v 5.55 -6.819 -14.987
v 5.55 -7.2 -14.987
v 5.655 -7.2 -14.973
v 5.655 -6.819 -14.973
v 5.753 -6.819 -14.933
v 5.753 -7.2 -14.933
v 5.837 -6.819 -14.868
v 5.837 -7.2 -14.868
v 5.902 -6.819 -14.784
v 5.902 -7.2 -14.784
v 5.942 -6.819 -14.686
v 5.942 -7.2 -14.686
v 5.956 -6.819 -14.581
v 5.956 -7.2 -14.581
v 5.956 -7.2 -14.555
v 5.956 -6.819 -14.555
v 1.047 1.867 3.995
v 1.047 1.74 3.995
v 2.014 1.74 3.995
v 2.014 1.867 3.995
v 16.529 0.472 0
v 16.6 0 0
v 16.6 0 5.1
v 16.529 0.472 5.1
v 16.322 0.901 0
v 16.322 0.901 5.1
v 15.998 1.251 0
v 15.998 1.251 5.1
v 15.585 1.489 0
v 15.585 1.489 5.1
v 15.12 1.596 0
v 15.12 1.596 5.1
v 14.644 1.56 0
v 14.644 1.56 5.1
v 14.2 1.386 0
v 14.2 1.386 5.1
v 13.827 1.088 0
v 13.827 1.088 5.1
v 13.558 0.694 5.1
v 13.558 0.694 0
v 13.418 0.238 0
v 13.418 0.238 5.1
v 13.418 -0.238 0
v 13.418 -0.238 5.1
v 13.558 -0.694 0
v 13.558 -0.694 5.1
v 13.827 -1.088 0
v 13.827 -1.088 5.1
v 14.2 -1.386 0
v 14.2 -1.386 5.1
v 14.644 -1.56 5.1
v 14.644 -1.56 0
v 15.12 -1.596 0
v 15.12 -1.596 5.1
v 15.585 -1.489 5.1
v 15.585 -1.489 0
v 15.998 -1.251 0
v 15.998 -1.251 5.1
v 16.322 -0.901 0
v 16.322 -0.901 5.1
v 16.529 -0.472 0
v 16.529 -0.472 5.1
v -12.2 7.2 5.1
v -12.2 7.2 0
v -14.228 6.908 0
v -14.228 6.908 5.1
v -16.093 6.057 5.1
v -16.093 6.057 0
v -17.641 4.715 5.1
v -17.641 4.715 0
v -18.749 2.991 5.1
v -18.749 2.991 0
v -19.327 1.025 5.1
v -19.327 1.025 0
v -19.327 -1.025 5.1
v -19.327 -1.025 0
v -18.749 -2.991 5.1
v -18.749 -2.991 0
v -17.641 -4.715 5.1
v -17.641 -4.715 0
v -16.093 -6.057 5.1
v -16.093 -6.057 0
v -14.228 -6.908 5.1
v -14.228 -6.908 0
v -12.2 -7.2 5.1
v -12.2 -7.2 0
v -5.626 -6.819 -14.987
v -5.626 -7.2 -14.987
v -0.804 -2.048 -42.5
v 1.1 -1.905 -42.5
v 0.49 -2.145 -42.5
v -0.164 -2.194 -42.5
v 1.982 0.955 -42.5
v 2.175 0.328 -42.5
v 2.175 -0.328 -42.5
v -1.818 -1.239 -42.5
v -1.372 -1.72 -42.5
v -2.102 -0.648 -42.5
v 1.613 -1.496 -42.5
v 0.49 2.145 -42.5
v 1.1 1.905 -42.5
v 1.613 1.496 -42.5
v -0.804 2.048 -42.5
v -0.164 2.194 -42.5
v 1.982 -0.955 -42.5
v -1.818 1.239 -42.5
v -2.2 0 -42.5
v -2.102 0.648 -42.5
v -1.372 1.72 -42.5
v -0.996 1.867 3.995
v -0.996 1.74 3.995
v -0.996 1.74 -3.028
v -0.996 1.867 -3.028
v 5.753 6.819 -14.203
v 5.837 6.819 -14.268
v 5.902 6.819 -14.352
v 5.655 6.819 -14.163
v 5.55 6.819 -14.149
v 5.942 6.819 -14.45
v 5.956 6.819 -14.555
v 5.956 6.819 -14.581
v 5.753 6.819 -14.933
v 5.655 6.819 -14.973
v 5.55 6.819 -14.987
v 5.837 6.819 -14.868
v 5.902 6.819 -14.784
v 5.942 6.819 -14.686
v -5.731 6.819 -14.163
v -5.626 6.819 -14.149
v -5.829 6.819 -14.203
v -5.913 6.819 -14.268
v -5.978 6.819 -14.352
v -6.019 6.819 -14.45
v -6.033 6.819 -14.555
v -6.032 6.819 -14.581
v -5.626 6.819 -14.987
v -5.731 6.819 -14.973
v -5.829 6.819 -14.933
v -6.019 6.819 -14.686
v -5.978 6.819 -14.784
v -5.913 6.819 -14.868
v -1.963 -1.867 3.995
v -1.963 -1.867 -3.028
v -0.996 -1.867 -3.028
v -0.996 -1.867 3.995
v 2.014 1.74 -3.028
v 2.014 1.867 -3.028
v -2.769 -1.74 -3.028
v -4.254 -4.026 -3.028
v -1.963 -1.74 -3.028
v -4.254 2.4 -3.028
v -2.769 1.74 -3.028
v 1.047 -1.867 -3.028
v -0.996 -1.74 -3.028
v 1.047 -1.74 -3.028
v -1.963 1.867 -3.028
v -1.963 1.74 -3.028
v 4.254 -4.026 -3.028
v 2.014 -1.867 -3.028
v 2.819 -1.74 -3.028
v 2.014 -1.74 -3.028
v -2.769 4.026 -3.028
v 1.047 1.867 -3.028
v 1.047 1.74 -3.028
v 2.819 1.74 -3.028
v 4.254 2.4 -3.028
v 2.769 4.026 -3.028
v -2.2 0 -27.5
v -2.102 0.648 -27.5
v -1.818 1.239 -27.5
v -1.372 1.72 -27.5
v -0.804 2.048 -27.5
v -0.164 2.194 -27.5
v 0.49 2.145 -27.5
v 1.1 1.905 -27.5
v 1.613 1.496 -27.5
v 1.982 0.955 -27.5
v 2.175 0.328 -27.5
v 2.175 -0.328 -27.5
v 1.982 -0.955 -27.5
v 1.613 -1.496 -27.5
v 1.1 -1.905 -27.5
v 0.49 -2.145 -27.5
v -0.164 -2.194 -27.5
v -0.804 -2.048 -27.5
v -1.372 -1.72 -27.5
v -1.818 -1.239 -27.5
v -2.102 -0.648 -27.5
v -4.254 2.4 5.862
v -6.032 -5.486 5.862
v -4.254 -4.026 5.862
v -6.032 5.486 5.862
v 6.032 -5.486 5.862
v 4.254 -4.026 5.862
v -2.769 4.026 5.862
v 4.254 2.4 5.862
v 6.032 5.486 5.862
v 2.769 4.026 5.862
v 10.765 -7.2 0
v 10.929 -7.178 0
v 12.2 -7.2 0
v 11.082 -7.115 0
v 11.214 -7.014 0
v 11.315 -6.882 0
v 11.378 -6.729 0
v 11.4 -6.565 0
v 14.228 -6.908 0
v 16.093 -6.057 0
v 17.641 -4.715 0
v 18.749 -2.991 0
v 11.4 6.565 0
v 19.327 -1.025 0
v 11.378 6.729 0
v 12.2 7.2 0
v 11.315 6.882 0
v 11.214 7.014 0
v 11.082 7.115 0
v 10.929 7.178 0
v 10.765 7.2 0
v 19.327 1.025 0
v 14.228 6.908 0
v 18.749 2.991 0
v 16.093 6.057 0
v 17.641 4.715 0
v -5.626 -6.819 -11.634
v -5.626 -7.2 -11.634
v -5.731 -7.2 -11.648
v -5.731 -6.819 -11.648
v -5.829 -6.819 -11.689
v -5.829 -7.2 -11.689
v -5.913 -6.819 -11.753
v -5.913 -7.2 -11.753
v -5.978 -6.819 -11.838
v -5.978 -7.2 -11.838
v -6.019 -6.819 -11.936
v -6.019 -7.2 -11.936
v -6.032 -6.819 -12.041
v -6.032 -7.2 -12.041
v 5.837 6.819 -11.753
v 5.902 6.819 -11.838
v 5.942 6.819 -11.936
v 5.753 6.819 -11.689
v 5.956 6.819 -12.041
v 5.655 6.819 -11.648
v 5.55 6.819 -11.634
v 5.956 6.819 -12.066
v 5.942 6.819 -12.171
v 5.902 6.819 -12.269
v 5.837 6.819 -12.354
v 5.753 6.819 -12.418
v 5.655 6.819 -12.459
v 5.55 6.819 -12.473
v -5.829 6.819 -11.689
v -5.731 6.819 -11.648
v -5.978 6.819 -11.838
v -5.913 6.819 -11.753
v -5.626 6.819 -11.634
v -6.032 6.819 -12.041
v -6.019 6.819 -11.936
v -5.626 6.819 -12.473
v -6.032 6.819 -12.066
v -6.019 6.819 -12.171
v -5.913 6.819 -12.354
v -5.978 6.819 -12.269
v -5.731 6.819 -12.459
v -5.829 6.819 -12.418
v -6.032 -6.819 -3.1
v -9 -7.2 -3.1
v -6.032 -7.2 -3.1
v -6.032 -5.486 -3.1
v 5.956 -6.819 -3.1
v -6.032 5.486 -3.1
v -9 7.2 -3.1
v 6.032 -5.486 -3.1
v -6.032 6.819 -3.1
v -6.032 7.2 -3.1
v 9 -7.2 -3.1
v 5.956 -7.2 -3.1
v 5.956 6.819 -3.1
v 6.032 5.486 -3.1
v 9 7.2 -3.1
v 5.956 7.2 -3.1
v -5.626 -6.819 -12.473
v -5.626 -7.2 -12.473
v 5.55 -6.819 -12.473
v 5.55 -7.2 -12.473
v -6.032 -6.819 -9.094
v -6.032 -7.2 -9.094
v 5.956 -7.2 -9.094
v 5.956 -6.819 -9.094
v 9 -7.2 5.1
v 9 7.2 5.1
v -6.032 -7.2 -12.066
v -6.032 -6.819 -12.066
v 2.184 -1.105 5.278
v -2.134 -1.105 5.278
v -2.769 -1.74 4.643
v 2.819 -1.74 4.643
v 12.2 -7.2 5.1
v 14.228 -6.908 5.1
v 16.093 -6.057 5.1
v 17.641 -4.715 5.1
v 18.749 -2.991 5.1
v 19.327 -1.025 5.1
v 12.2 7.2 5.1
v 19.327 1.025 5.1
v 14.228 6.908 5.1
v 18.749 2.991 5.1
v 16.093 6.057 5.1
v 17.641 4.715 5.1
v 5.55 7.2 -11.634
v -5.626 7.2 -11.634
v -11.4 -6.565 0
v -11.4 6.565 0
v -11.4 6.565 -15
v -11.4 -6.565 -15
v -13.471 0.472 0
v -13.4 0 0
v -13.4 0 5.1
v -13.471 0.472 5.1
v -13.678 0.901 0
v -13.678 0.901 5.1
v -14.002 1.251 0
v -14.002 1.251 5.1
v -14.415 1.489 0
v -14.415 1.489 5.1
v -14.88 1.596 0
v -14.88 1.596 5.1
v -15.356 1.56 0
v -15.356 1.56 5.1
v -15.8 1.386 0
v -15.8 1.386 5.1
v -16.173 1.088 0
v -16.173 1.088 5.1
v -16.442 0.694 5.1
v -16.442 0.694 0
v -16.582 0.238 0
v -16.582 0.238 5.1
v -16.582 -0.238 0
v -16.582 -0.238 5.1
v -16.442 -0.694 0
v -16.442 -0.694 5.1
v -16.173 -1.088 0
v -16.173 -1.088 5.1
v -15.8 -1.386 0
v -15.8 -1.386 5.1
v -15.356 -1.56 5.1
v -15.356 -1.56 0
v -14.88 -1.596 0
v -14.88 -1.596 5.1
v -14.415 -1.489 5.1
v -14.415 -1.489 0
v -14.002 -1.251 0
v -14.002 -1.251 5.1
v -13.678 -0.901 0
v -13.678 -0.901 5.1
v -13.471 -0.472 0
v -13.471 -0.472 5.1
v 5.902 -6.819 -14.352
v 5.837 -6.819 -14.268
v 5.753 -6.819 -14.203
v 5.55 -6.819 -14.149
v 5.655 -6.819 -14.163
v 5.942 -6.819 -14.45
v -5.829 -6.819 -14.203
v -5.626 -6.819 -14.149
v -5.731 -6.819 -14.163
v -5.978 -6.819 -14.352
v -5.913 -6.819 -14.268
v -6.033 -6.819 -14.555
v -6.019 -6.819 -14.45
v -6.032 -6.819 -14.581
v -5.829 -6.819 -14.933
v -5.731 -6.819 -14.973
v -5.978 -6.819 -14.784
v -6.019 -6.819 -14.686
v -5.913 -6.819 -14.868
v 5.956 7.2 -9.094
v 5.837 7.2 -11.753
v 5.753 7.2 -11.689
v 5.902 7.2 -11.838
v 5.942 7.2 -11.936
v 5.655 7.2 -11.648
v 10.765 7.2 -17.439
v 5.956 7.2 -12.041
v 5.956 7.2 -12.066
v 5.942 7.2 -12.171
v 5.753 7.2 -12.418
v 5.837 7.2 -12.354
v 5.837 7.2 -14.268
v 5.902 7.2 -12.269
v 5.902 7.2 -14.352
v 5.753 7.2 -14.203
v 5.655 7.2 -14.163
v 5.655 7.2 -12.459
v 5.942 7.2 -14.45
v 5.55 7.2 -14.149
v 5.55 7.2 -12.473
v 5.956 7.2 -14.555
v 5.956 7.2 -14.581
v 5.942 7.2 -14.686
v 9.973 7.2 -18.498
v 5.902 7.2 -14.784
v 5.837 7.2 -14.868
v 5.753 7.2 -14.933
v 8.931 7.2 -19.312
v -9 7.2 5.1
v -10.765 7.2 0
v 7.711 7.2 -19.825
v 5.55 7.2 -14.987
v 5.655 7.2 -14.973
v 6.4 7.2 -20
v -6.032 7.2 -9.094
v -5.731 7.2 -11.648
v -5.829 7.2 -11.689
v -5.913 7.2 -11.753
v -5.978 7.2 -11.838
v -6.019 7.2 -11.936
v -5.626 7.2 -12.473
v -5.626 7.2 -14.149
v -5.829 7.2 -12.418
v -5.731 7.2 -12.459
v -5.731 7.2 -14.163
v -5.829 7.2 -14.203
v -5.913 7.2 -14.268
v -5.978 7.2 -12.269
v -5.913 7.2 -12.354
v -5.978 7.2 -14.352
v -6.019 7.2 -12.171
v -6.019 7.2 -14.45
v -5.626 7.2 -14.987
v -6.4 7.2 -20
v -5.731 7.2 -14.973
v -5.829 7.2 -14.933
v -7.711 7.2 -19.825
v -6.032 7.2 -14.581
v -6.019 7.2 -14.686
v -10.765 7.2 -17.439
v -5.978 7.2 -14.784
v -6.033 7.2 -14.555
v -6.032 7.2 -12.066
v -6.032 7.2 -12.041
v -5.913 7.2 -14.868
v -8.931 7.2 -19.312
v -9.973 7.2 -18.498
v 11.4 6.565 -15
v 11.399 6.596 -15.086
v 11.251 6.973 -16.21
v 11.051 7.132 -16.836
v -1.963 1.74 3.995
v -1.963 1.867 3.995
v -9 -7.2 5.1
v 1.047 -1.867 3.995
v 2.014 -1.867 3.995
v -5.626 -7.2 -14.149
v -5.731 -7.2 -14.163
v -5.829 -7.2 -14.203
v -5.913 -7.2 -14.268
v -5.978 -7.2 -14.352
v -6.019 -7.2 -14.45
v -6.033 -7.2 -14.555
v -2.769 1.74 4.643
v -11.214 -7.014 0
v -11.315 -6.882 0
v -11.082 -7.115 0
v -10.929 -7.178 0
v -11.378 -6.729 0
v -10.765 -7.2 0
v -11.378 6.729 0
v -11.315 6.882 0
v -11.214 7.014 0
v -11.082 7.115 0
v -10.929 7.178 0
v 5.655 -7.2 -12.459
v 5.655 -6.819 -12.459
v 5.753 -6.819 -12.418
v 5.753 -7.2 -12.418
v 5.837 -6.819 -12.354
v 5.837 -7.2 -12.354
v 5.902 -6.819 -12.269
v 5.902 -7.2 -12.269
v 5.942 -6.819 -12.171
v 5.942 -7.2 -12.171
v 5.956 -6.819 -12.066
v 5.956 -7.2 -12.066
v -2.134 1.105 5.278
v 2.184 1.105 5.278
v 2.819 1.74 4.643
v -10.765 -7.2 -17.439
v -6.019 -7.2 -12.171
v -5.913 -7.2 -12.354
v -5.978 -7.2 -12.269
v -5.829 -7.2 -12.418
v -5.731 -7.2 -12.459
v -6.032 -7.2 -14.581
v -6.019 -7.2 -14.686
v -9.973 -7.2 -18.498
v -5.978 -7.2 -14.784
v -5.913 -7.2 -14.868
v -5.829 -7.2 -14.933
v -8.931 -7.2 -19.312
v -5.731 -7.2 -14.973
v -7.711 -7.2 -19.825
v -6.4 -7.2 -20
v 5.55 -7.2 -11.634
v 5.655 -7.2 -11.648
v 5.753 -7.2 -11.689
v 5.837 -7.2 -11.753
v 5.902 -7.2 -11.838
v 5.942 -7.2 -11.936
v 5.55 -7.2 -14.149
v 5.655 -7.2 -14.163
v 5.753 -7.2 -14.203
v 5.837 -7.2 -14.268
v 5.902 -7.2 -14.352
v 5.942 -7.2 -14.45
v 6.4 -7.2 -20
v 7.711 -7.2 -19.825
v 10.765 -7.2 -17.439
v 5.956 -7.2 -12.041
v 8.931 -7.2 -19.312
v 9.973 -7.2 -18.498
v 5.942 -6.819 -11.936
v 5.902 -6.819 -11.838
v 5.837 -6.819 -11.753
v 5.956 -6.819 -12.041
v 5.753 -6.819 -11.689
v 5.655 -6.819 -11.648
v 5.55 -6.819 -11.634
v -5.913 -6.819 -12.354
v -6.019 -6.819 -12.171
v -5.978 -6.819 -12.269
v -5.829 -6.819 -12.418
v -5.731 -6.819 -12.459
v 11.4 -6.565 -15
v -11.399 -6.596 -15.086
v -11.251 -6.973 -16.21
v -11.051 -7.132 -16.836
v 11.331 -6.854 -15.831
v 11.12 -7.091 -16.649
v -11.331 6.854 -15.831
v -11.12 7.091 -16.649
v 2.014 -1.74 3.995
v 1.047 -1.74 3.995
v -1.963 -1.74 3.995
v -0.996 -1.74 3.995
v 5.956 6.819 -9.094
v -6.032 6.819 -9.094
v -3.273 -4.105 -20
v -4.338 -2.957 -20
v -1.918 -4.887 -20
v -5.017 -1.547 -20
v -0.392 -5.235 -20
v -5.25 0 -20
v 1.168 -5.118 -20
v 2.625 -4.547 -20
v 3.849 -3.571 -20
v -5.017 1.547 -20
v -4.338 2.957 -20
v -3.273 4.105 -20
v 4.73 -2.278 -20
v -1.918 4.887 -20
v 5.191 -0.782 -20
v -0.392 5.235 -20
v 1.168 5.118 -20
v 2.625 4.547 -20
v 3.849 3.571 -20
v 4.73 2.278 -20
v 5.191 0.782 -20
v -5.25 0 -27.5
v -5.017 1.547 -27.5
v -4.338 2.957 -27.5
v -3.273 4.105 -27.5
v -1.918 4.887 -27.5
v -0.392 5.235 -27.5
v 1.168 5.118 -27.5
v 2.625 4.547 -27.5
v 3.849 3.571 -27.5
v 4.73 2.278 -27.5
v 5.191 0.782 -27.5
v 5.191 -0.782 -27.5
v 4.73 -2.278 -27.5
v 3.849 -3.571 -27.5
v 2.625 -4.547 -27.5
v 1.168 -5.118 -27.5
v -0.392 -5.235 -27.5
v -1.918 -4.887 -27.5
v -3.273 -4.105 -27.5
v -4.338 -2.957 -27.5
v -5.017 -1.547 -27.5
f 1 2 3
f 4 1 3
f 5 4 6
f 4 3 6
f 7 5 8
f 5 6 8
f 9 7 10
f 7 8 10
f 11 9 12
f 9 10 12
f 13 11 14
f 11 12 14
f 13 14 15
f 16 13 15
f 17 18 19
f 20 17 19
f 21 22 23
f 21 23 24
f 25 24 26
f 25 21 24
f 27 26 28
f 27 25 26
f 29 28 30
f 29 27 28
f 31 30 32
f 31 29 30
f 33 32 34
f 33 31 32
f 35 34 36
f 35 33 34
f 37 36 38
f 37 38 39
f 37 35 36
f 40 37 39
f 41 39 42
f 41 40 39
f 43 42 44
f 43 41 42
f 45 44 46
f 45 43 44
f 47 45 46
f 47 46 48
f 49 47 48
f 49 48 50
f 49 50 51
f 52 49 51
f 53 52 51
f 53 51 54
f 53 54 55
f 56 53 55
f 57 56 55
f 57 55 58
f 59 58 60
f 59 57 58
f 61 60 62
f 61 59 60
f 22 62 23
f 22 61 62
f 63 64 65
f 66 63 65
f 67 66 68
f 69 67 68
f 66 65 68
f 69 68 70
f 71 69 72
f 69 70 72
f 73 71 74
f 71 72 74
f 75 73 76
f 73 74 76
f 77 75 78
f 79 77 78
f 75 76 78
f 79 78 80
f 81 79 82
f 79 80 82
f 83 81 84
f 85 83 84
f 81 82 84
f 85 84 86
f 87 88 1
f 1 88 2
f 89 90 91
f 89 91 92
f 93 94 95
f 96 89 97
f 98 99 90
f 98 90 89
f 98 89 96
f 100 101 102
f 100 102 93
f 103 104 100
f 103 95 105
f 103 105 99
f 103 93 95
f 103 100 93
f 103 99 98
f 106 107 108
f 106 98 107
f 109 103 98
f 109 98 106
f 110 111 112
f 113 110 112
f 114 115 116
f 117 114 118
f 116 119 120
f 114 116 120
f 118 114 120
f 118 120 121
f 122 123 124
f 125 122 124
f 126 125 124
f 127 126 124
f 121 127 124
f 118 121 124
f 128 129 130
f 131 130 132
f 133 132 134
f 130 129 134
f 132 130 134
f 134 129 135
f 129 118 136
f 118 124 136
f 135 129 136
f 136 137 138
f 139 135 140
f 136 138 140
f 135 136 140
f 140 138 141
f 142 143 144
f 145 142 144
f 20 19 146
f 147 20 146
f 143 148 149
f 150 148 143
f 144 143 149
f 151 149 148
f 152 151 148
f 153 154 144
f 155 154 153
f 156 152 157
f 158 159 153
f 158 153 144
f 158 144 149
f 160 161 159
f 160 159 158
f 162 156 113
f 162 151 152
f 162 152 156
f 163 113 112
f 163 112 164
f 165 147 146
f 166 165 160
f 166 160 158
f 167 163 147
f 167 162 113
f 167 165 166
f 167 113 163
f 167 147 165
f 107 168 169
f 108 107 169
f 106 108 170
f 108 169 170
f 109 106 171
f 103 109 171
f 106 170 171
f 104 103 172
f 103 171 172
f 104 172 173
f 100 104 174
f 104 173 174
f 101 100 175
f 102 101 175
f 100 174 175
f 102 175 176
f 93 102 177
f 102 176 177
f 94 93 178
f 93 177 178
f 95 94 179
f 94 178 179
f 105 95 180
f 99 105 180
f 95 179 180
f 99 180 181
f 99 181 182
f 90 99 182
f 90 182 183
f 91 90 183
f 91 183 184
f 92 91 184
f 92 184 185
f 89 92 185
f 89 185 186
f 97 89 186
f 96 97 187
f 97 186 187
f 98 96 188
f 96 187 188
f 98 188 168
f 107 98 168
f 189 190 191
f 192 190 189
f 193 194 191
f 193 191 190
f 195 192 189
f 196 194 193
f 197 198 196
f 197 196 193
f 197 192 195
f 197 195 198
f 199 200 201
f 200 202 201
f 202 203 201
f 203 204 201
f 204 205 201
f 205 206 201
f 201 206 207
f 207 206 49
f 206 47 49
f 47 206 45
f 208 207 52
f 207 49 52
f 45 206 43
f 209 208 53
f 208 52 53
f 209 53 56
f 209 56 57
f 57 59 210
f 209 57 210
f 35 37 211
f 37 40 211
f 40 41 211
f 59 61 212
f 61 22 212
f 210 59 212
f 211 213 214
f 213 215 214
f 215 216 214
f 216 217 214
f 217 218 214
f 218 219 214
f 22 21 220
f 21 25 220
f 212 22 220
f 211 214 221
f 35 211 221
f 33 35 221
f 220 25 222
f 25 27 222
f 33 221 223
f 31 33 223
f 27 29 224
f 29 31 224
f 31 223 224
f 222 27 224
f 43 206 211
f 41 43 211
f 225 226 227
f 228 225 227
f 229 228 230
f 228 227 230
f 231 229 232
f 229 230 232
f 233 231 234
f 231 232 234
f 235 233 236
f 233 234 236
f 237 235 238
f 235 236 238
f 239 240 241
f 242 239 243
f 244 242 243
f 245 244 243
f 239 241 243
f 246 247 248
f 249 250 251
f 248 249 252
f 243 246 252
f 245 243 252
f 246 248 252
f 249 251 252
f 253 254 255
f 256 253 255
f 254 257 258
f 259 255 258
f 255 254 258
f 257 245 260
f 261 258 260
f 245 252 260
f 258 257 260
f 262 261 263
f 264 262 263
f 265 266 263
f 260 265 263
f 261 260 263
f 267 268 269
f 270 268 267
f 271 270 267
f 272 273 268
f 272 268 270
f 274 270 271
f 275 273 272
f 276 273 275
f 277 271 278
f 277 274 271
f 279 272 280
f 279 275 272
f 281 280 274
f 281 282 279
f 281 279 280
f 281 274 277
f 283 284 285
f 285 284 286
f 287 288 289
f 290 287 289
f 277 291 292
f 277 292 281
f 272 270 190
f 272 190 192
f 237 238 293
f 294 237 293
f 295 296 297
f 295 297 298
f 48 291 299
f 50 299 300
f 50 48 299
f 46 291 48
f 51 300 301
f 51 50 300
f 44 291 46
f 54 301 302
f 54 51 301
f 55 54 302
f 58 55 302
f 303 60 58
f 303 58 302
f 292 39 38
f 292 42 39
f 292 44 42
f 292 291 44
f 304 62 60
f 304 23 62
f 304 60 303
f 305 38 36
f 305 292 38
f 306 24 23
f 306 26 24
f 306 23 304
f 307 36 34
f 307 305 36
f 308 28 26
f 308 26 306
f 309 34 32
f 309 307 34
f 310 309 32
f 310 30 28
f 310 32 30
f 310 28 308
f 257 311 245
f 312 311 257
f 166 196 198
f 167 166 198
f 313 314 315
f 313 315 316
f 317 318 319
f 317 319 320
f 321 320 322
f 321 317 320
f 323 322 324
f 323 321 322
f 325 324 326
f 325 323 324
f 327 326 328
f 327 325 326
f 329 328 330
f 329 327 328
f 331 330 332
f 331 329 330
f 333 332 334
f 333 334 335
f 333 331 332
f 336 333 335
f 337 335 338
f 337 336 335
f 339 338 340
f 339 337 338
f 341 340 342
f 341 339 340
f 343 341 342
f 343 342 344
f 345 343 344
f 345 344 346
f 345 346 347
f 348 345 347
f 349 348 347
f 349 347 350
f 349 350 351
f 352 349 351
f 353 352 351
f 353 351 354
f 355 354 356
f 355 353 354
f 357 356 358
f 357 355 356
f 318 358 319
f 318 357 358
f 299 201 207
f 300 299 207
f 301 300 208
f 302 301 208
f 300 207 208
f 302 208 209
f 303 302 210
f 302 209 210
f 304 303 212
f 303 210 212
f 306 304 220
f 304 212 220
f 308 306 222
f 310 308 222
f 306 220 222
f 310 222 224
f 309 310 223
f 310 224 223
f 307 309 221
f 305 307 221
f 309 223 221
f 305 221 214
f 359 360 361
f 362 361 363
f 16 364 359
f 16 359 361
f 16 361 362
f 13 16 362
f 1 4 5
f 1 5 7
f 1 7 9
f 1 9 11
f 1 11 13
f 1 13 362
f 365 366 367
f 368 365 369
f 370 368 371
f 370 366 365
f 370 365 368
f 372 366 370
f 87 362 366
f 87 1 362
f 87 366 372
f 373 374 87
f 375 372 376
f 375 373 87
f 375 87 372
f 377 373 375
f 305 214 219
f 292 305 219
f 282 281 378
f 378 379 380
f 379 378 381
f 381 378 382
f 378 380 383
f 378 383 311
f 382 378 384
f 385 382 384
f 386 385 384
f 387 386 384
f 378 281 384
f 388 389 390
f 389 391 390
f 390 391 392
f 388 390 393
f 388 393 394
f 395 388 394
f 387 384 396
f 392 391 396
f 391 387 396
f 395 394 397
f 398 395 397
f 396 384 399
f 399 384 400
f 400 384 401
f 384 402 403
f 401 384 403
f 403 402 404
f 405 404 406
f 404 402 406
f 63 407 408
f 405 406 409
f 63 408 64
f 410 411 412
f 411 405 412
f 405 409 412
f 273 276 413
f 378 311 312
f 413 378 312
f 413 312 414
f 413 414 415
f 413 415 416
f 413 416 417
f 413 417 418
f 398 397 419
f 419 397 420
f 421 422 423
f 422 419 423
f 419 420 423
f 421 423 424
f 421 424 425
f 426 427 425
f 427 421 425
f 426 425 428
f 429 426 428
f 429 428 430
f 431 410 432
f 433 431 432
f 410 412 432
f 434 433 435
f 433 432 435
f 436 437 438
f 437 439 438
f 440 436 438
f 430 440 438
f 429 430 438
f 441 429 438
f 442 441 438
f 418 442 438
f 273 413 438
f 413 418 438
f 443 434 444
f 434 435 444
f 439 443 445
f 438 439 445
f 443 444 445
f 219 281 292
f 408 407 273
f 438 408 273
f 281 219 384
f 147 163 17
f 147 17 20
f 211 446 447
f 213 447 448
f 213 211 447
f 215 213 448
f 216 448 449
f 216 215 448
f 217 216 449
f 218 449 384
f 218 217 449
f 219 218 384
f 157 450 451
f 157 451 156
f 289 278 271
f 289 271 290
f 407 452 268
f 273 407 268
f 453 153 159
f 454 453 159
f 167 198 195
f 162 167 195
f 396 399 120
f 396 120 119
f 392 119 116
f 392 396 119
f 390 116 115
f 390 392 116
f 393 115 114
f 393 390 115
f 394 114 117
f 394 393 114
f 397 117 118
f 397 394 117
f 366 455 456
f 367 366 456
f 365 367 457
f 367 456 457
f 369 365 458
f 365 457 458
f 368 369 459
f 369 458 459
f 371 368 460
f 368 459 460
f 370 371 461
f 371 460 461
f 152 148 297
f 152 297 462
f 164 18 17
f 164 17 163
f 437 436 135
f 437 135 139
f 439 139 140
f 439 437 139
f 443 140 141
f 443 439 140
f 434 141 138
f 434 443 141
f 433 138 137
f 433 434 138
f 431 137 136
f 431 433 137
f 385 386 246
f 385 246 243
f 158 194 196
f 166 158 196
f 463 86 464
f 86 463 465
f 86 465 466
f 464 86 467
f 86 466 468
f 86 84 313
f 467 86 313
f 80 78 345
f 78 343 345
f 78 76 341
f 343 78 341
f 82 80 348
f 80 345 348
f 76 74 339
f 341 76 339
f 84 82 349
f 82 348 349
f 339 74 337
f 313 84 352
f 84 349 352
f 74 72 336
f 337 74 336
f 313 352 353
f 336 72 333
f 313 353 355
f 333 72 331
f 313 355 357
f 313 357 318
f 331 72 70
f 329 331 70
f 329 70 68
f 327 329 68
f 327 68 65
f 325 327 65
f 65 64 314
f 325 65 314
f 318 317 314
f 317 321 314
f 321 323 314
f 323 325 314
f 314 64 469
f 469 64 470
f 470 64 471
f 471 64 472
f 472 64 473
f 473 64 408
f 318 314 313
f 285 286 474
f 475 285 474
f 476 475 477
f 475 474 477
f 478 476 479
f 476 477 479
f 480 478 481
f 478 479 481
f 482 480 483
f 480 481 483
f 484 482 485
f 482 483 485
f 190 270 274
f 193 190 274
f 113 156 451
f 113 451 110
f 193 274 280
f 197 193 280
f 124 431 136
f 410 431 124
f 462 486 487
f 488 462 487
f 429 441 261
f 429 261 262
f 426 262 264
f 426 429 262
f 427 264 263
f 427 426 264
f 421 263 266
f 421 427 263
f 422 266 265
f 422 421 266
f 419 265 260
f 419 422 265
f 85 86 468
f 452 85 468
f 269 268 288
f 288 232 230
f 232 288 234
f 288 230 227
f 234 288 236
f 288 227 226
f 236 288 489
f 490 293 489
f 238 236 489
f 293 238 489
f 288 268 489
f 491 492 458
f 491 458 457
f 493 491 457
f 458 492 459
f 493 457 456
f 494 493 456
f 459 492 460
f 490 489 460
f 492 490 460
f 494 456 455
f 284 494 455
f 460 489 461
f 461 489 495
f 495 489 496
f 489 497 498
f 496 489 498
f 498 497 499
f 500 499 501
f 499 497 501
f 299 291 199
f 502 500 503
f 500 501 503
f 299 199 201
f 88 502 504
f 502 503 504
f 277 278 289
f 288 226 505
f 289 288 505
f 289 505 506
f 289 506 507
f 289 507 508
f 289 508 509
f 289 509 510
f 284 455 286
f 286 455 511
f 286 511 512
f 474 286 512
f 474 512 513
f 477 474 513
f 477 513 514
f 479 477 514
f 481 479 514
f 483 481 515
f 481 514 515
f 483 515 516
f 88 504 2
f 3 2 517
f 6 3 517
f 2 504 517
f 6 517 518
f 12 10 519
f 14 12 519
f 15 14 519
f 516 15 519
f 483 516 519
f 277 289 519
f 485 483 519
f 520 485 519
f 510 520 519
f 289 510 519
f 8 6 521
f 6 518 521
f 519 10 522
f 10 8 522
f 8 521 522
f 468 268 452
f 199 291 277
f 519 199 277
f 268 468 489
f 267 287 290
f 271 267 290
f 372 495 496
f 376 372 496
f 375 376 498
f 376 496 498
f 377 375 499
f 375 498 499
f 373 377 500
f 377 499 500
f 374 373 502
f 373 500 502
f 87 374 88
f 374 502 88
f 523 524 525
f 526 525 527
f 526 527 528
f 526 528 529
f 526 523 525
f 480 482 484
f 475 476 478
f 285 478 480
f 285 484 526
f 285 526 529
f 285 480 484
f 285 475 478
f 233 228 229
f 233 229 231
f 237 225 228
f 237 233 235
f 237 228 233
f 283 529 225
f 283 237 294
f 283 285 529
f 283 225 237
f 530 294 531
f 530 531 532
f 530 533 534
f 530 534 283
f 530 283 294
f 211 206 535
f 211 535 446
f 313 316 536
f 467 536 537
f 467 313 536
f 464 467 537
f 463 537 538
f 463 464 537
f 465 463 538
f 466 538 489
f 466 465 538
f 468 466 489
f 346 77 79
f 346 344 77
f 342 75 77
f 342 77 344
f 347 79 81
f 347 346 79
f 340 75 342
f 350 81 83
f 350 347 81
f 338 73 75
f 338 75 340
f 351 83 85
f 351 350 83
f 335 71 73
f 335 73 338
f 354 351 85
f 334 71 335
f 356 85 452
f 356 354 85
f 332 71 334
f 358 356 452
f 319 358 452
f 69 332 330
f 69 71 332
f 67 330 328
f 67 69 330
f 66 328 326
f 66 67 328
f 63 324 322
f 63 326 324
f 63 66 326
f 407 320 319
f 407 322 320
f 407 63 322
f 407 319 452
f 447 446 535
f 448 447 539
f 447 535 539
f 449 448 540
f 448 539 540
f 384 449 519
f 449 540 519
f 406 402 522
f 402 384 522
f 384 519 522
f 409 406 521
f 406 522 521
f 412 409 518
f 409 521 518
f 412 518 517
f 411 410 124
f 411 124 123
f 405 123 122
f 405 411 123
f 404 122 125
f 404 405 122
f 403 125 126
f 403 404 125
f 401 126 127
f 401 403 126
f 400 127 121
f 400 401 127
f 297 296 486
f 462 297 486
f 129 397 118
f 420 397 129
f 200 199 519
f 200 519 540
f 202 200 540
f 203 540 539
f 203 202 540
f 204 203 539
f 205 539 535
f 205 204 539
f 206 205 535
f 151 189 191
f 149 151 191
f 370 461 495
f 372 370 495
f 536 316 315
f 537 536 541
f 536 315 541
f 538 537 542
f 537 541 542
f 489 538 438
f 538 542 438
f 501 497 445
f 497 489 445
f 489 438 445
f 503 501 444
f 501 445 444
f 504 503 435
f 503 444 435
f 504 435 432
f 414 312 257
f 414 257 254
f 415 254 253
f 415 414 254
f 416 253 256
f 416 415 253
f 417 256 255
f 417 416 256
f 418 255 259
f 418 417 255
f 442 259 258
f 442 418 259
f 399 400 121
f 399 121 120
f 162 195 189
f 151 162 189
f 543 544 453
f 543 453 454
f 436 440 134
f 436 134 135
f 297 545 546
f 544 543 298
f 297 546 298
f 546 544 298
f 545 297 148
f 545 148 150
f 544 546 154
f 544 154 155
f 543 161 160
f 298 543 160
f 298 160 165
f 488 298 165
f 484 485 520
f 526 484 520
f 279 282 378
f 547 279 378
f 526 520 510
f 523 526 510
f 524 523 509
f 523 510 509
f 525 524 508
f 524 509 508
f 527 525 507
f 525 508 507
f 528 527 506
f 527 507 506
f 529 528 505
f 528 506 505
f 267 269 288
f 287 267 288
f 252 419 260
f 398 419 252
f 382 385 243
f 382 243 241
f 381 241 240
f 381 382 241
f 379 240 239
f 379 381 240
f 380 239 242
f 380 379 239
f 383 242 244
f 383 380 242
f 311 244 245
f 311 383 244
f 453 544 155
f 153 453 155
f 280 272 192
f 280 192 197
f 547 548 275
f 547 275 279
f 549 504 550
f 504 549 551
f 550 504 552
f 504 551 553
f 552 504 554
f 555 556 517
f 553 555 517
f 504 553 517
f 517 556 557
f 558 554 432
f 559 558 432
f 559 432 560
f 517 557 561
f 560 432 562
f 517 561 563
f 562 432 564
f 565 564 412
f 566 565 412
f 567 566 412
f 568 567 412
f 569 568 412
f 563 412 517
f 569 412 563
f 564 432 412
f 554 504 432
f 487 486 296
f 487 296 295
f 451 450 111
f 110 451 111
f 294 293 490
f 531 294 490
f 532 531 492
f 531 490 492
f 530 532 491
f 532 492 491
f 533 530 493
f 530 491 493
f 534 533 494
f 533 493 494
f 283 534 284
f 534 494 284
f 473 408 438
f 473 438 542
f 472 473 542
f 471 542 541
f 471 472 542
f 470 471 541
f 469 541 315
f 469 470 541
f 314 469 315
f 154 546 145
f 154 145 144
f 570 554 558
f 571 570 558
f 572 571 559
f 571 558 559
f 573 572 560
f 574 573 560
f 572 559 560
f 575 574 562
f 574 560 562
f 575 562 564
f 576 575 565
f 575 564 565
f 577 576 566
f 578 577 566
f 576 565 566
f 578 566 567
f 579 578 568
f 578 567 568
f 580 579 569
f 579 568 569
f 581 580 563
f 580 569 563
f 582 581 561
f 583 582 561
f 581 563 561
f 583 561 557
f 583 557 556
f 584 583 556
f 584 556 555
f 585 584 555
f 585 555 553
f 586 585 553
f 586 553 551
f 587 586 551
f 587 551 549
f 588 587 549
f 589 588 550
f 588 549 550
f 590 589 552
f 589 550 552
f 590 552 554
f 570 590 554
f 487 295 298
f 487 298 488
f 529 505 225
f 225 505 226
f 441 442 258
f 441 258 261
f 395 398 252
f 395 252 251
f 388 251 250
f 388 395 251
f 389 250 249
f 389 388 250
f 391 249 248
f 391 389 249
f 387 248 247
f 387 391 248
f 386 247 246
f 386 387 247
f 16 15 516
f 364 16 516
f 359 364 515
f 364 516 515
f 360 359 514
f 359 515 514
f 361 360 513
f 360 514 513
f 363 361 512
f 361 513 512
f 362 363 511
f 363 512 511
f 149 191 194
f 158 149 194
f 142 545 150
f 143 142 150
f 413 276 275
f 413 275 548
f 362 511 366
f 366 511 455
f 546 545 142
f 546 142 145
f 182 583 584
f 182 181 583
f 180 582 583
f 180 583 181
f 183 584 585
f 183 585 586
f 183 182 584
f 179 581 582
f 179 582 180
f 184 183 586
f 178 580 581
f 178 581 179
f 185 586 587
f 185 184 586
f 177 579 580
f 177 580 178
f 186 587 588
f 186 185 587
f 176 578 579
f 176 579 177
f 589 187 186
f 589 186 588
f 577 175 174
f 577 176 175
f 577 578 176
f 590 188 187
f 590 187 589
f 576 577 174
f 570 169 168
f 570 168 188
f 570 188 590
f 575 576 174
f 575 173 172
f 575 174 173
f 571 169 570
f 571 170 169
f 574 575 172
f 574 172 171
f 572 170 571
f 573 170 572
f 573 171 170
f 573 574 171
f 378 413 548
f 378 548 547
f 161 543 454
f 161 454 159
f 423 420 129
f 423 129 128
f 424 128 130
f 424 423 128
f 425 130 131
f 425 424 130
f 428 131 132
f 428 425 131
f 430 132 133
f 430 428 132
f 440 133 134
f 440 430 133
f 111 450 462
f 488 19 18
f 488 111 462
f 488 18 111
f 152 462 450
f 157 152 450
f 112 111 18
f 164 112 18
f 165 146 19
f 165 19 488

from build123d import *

# Parameters (mm, degrees)
SKETCH1_R           = 1.6
BOSS_EXTRUDE1_DEPTH = 5.1
BOSS_EXTRUDE2_DEPTH = 20
SKETCH3_R           = 5.25
BOSS_EXTRUDE3_DEPTH = 7.5
SKETCH4_R           = 2.2
BOSS_EXTRUDE4_DEPTH = 15
SKETCH11_W          = 18
SKETCH11_H          = 8.2
CUT_EXTRUDE3_DEPTH  = 49.887319419
SKETCH5_W           = 12.065
SKETCH5_H           = 10.9728
BOSS_EXTRUDE5_DEPTH = 0.762
SKETCH12_W          = 12.065
SKETCH12_H          = 10.9728
BOSS_EXTRUDE9_DEPTH = 8.2
CUT_EXTRUDE1_DEPTH  = 8.89
SKETCH7_W           = 5.588
SKETCH7_H           = 3.4798
BOSS_EXTRUDE6_DEPTH = 8.3058
CHAMFER1_SIZE       = 0.635
SKETCH8_W           = 0.967388598
SKETCH8_H           = 7.023469871
BOSS_EXTRUDE7_DEPTH = 0.127
SKETCH9_W           = 11.9888
SKETCH9_H           = 5.9944
CUT_EXTRUDE2_DEPTH  = 0.381
FILLET1_R           = 5


with BuildPart() as part:
    # Sketch1 → Boss-Extrude1 (new body)
    with BuildSketch(Plane.XY):
        with BuildLine():
            Line((-12.2, -7.2), (12.2, -7.2))
            ThreePointArc((12.2, -7.2), (19.4, 0), (12.2, 7.2))
            Line((12.2, 7.2), (-12.2, 7.2))
            ThreePointArc((-12.2, 7.2), (-19.4, 0), (-12.2, -7.2))
        make_face()
        with Locations((-15, 0)):
            Circle(SKETCH1_R, mode=Mode.SUBTRACT)
        with Locations((15, 0)):
            Circle(SKETCH1_R, mode=Mode.SUBTRACT)
    extrude(amount=BOSS_EXTRUDE1_DEPTH)

    # Sketch2 → Boss-Extrude2 (add)
    with BuildSketch(Plane(origin=(0, 0, 0), x_dir=(-1, 0, 0), z_dir=(0, 0, -1))):
        with BuildLine():
            Line((-10.765, 7.2), (10.765, 7.2))
            ThreePointArc((10.765, 7.2), (11.214012806, 7.014012806), (11.4, 6.565))
            Line((11.4, 6.565), (11.4, -6.565))
            ThreePointArc((11.4, -6.565), (11.214012806, -7.014012806), (10.765, -7.2))
            Line((10.765, -7.2), (-10.765, -7.2))
            ThreePointArc((-10.765, -7.2), (-11.214012806, -7.014012806), (-11.4, -6.565))
            Line((-11.4, -6.565), (-11.4, 6.565))
            ThreePointArc((-11.4, 6.565), (-11.214012806, 7.014012806), (-10.765, 7.2))
        make_face()
    extrude(amount=BOSS_EXTRUDE2_DEPTH)

    # Sketch3 → Boss-Extrude3 (add)
    with BuildSketch(Plane(origin=(0, 0, -20), x_dir=(-1, 0, 0), z_dir=(0, 0, -1))):
        Circle(SKETCH3_R)
    extrude(amount=BOSS_EXTRUDE3_DEPTH)

    # Sketch4 → Boss-Extrude4 (add)
    with BuildSketch(Plane(origin=(0, 0, -27.5), x_dir=(-1, 0, 0), z_dir=(0, 0, -1))):
        Circle(SKETCH4_R)
    extrude(amount=BOSS_EXTRUDE4_DEPTH)

    # Sketch11 → Cut-Extrude3 (cut, through all)
    with BuildSketch(Plane(origin=(0, 7.2, 0), x_dir=(1, 0, 0), z_dir=(0, 1, 0))):
        with Locations((0, -1)):
            Rectangle(SKETCH11_W, SKETCH11_H)
    extrude(amount=-CUT_EXTRUDE3_DEPTH, mode=Mode.SUBTRACT)



with BuildPart() as body_2:
    # Sketch5 → Boss-Extrude5 (new body)
    with BuildSketch(Plane.XY.offset(5.1)):
        Rectangle(SKETCH5_W, SKETCH5_H)
    extrude(amount=BOSS_EXTRUDE5_DEPTH)


with BuildPart() as part_1:
    add(part.part)

    add(body_2.part)  # Boss-Extrude9 merges body 2
    # Sketch12 → Boss-Extrude9 (add)
    with BuildSketch(Plane.XY.offset(-3.1)):
        Rectangle(SKETCH12_W, SKETCH12_H)
    extrude(amount=BOSS_EXTRUDE9_DEPTH)

    # Sketch6 → Cut-Extrude1 (cut)
    with BuildSketch(Plane.XY.offset(5.862)):
        Polygon((-4.2545, 2.4003), (-4.2545, -4.0259), (4.2545, -4.0259), (4.2545, 2.4003), (2.7686, 4.0259), (-2.7686, 4.0259), align=None)
    extrude(amount=-CUT_EXTRUDE1_DEPTH, mode=Mode.SUBTRACT)

    # Sketch7 → Boss-Extrude6 (add)
    with BuildSketch(Plane.XY.offset(-3.028)):
        with Locations((0.0254, 0)):
            Rectangle(SKETCH7_W, SKETCH7_H)
    extrude(amount=BOSS_EXTRUDE6_DEPTH)

    # Chamfer1
    chamfer1_edges = [part_1.edges().sort_by_distance(p)[0] for p in [
        (0.0254, 1.7399, 5.2778),
        (-2.7686, 0, 5.2778),
        (0.0254, -1.7399, 5.2778),
        (2.8194, 0, 5.2778),
    ]]
    chamfer(chamfer1_edges, length=CHAMFER1_SIZE)

    # Sketch8 → Boss-Extrude7 (add)
    with BuildSketch(Plane(origin=(0, 1.7399, 0), x_dir=(1, 0, 0), z_dir=(0, 1, 0))):
        with Locations((-1.479557486, -0.483734936)):
            Rectangle(SKETCH8_W, SKETCH8_H)
        with Locations((1.530357486, -0.483734936)):
            Rectangle(SKETCH8_W, SKETCH8_H)
    boss_extrude7 = extrude(amount=BOSS_EXTRUDE7_DEPTH)

    # Mirror1: Boss-Extrude7 across plane
    add(boss_extrude7.mirror(Plane(origin=(0, 0, 0), x_dir=(0, 0, 1), z_dir=(0, -1, 0))))

    # Sketch9 → Cut-Extrude2 (cut)
    with BuildSketch(Plane(origin=(0, 7.2, 0), x_dir=(1, 0, 0), z_dir=(0, 1, 0))):
        with Locations((-0.0381, 6.0972)):
            Rectangle(SKETCH9_W, SKETCH9_H)
        with BuildLine():
            Line((-5.6261, 12.4726), (5.5499, 12.4726))
            ThreePointArc((5.5499, 12.4726), (5.837268196, 12.353568196), (5.9563, 12.0662))
            Line((5.9563, 12.0662), (5.9563, 12.0408))
            ThreePointArc((5.9563, 12.0408), (5.837268196, 11.753431804), (5.5499, 11.6344))
            Line((5.5499, 11.6344), (-5.6261, 11.6344))
            ThreePointArc((-5.6261, 11.6344), (-5.913468196, 11.753431804), (-6.0325, 12.0408))
            Line((-6.0325, 12.0408), (-6.0325, 12.0662))
            ThreePointArc((-6.0325, 12.0662), (-5.913468196, 12.353568196), (-5.6261, 12.4726))
        make_face()
        with BuildLine():
            Line((-5.6261, 14.9872), (5.5499, 14.9872))
            ThreePointArc((5.5499, 14.9872), (5.837268196, 14.868168196), (5.9563, 14.5808))
            Line((5.9563, 14.5808), (5.9563, 14.5554))
            ThreePointArc((5.9563, 14.5554), (5.837268196, 14.268031804), (5.5499, 14.149))
            Line((5.5499, 14.149), (-5.6261, 14.149))
            ThreePointArc((-5.6261, 14.149), (-5.913468196, 14.268031804), (-6.0325, 14.5554))
            Line((-6.0325, 14.5554), (-6.0325, 14.5808))
            ThreePointArc((-6.0325, 14.5808), (-5.913468196, 14.868168196), (-5.6261, 14.9872))
        make_face()
    cut_extrude2 = extrude(amount=-CUT_EXTRUDE2_DEPTH, mode=Mode.SUBTRACT)

    # Mirror3: Cut-Extrude2 across plane
    add(cut_extrude2.mirror(Plane.ZX), mode=Mode.SUBTRACT)

    # Fillet1
    # the kernel refuses this fillet: 5 mm, written as the material it takes off along each edge
    with BuildSketch(Plane(origin=(11.4, -19.065, -20), x_dir=(-1, 0, 0), z_dir=(0, 1, 0)), Plane(origin=(-11.4, 19.065, -20), x_dir=(1, 0, 0), z_dir=(0, -1, 0))) as fillet1_piece_1:
        with BuildLine():
            CenterArc((FILLET1_R, FILLET1_R), FILLET1_R, 180, 90)
            Line((0, FILLET1_R), (0, 0))
            Line((0, 0), (FILLET1_R, 0))
        make_face()
    extrude(amount=38.13, mode=Mode.SUBTRACT)


solid = part_1.part
